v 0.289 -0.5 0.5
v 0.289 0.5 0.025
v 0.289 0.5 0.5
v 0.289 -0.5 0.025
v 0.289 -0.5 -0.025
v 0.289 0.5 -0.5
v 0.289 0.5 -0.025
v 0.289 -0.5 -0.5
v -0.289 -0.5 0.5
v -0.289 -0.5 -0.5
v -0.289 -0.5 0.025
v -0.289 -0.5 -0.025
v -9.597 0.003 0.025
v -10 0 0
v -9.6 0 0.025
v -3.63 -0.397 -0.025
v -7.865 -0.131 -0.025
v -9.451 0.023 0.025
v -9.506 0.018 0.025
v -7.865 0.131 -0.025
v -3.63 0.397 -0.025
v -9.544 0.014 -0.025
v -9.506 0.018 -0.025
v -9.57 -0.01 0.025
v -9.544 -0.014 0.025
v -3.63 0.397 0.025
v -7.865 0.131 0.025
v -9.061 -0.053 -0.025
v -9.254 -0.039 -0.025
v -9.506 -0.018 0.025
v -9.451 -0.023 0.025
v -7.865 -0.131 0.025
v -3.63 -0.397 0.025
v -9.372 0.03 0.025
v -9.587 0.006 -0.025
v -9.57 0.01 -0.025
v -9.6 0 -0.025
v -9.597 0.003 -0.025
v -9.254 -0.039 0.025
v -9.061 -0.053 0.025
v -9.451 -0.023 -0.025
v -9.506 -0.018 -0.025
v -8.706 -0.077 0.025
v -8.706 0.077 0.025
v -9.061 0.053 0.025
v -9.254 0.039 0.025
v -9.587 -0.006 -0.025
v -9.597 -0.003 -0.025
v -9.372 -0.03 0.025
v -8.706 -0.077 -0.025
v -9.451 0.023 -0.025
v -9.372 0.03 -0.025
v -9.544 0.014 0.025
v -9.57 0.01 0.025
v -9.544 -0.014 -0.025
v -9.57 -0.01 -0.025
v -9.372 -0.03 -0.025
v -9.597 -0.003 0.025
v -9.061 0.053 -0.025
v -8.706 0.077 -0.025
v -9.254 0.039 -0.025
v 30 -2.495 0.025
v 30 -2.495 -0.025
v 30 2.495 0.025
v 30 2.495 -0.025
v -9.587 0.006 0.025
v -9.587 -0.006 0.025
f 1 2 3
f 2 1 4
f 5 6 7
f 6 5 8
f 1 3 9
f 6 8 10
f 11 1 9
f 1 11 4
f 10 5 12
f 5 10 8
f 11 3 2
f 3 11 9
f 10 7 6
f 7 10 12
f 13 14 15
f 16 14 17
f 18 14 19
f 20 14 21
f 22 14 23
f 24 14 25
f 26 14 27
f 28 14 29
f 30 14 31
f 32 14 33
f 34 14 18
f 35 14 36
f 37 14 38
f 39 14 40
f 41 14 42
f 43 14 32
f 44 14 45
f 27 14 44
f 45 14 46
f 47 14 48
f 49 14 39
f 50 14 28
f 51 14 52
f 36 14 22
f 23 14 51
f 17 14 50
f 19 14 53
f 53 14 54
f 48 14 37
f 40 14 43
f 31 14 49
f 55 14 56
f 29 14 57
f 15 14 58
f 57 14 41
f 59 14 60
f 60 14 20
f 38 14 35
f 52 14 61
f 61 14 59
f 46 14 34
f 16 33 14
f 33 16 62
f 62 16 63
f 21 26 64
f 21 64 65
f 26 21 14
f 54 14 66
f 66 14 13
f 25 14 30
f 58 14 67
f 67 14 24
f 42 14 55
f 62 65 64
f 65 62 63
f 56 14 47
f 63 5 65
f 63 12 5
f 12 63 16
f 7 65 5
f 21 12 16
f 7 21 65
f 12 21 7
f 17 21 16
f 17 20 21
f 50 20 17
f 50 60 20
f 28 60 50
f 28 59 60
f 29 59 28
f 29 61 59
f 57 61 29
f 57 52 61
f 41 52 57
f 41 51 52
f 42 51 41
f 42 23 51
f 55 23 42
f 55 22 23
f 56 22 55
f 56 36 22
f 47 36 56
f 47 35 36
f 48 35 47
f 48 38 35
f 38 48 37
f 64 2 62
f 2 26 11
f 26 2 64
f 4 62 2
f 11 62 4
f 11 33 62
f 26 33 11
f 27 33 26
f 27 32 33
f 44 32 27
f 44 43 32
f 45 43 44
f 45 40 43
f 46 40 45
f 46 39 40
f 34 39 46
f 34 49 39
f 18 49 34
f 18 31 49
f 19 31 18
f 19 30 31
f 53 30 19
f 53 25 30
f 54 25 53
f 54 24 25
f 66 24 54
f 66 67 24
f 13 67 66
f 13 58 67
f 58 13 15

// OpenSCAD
difference() {
  translate([-0.21131,0,0]) 
    color("gold",alpha=0.9) cube([1,1,1],center=true);
  rotate([0,0,-30]) translate([-1.5000,0,0]) 
    color("gold",alpha=0.9) 
    cube([3,3,3],center=true);
}

//translate([30,0,0]) { color("red")
//    cube([0.1,5.0,0.1],true);
//}

//translate([-10,0,0]) { color("blue")
//    cube([0.1,0.1,0.1],true);
//}

color("gray",alpha=0.3) 
difference() {
  translate([10,0,0]) rotate([0,-90,0])
    cylinder(h=40,r1=2.5,r2=0,center=true,$fn=50);
  translate([10,0,-2.525]) {
      cube([50,6,5],true);
  }
  translate([10,0,+2.525]) {
      cube([50,6,5],true);
  }
}
